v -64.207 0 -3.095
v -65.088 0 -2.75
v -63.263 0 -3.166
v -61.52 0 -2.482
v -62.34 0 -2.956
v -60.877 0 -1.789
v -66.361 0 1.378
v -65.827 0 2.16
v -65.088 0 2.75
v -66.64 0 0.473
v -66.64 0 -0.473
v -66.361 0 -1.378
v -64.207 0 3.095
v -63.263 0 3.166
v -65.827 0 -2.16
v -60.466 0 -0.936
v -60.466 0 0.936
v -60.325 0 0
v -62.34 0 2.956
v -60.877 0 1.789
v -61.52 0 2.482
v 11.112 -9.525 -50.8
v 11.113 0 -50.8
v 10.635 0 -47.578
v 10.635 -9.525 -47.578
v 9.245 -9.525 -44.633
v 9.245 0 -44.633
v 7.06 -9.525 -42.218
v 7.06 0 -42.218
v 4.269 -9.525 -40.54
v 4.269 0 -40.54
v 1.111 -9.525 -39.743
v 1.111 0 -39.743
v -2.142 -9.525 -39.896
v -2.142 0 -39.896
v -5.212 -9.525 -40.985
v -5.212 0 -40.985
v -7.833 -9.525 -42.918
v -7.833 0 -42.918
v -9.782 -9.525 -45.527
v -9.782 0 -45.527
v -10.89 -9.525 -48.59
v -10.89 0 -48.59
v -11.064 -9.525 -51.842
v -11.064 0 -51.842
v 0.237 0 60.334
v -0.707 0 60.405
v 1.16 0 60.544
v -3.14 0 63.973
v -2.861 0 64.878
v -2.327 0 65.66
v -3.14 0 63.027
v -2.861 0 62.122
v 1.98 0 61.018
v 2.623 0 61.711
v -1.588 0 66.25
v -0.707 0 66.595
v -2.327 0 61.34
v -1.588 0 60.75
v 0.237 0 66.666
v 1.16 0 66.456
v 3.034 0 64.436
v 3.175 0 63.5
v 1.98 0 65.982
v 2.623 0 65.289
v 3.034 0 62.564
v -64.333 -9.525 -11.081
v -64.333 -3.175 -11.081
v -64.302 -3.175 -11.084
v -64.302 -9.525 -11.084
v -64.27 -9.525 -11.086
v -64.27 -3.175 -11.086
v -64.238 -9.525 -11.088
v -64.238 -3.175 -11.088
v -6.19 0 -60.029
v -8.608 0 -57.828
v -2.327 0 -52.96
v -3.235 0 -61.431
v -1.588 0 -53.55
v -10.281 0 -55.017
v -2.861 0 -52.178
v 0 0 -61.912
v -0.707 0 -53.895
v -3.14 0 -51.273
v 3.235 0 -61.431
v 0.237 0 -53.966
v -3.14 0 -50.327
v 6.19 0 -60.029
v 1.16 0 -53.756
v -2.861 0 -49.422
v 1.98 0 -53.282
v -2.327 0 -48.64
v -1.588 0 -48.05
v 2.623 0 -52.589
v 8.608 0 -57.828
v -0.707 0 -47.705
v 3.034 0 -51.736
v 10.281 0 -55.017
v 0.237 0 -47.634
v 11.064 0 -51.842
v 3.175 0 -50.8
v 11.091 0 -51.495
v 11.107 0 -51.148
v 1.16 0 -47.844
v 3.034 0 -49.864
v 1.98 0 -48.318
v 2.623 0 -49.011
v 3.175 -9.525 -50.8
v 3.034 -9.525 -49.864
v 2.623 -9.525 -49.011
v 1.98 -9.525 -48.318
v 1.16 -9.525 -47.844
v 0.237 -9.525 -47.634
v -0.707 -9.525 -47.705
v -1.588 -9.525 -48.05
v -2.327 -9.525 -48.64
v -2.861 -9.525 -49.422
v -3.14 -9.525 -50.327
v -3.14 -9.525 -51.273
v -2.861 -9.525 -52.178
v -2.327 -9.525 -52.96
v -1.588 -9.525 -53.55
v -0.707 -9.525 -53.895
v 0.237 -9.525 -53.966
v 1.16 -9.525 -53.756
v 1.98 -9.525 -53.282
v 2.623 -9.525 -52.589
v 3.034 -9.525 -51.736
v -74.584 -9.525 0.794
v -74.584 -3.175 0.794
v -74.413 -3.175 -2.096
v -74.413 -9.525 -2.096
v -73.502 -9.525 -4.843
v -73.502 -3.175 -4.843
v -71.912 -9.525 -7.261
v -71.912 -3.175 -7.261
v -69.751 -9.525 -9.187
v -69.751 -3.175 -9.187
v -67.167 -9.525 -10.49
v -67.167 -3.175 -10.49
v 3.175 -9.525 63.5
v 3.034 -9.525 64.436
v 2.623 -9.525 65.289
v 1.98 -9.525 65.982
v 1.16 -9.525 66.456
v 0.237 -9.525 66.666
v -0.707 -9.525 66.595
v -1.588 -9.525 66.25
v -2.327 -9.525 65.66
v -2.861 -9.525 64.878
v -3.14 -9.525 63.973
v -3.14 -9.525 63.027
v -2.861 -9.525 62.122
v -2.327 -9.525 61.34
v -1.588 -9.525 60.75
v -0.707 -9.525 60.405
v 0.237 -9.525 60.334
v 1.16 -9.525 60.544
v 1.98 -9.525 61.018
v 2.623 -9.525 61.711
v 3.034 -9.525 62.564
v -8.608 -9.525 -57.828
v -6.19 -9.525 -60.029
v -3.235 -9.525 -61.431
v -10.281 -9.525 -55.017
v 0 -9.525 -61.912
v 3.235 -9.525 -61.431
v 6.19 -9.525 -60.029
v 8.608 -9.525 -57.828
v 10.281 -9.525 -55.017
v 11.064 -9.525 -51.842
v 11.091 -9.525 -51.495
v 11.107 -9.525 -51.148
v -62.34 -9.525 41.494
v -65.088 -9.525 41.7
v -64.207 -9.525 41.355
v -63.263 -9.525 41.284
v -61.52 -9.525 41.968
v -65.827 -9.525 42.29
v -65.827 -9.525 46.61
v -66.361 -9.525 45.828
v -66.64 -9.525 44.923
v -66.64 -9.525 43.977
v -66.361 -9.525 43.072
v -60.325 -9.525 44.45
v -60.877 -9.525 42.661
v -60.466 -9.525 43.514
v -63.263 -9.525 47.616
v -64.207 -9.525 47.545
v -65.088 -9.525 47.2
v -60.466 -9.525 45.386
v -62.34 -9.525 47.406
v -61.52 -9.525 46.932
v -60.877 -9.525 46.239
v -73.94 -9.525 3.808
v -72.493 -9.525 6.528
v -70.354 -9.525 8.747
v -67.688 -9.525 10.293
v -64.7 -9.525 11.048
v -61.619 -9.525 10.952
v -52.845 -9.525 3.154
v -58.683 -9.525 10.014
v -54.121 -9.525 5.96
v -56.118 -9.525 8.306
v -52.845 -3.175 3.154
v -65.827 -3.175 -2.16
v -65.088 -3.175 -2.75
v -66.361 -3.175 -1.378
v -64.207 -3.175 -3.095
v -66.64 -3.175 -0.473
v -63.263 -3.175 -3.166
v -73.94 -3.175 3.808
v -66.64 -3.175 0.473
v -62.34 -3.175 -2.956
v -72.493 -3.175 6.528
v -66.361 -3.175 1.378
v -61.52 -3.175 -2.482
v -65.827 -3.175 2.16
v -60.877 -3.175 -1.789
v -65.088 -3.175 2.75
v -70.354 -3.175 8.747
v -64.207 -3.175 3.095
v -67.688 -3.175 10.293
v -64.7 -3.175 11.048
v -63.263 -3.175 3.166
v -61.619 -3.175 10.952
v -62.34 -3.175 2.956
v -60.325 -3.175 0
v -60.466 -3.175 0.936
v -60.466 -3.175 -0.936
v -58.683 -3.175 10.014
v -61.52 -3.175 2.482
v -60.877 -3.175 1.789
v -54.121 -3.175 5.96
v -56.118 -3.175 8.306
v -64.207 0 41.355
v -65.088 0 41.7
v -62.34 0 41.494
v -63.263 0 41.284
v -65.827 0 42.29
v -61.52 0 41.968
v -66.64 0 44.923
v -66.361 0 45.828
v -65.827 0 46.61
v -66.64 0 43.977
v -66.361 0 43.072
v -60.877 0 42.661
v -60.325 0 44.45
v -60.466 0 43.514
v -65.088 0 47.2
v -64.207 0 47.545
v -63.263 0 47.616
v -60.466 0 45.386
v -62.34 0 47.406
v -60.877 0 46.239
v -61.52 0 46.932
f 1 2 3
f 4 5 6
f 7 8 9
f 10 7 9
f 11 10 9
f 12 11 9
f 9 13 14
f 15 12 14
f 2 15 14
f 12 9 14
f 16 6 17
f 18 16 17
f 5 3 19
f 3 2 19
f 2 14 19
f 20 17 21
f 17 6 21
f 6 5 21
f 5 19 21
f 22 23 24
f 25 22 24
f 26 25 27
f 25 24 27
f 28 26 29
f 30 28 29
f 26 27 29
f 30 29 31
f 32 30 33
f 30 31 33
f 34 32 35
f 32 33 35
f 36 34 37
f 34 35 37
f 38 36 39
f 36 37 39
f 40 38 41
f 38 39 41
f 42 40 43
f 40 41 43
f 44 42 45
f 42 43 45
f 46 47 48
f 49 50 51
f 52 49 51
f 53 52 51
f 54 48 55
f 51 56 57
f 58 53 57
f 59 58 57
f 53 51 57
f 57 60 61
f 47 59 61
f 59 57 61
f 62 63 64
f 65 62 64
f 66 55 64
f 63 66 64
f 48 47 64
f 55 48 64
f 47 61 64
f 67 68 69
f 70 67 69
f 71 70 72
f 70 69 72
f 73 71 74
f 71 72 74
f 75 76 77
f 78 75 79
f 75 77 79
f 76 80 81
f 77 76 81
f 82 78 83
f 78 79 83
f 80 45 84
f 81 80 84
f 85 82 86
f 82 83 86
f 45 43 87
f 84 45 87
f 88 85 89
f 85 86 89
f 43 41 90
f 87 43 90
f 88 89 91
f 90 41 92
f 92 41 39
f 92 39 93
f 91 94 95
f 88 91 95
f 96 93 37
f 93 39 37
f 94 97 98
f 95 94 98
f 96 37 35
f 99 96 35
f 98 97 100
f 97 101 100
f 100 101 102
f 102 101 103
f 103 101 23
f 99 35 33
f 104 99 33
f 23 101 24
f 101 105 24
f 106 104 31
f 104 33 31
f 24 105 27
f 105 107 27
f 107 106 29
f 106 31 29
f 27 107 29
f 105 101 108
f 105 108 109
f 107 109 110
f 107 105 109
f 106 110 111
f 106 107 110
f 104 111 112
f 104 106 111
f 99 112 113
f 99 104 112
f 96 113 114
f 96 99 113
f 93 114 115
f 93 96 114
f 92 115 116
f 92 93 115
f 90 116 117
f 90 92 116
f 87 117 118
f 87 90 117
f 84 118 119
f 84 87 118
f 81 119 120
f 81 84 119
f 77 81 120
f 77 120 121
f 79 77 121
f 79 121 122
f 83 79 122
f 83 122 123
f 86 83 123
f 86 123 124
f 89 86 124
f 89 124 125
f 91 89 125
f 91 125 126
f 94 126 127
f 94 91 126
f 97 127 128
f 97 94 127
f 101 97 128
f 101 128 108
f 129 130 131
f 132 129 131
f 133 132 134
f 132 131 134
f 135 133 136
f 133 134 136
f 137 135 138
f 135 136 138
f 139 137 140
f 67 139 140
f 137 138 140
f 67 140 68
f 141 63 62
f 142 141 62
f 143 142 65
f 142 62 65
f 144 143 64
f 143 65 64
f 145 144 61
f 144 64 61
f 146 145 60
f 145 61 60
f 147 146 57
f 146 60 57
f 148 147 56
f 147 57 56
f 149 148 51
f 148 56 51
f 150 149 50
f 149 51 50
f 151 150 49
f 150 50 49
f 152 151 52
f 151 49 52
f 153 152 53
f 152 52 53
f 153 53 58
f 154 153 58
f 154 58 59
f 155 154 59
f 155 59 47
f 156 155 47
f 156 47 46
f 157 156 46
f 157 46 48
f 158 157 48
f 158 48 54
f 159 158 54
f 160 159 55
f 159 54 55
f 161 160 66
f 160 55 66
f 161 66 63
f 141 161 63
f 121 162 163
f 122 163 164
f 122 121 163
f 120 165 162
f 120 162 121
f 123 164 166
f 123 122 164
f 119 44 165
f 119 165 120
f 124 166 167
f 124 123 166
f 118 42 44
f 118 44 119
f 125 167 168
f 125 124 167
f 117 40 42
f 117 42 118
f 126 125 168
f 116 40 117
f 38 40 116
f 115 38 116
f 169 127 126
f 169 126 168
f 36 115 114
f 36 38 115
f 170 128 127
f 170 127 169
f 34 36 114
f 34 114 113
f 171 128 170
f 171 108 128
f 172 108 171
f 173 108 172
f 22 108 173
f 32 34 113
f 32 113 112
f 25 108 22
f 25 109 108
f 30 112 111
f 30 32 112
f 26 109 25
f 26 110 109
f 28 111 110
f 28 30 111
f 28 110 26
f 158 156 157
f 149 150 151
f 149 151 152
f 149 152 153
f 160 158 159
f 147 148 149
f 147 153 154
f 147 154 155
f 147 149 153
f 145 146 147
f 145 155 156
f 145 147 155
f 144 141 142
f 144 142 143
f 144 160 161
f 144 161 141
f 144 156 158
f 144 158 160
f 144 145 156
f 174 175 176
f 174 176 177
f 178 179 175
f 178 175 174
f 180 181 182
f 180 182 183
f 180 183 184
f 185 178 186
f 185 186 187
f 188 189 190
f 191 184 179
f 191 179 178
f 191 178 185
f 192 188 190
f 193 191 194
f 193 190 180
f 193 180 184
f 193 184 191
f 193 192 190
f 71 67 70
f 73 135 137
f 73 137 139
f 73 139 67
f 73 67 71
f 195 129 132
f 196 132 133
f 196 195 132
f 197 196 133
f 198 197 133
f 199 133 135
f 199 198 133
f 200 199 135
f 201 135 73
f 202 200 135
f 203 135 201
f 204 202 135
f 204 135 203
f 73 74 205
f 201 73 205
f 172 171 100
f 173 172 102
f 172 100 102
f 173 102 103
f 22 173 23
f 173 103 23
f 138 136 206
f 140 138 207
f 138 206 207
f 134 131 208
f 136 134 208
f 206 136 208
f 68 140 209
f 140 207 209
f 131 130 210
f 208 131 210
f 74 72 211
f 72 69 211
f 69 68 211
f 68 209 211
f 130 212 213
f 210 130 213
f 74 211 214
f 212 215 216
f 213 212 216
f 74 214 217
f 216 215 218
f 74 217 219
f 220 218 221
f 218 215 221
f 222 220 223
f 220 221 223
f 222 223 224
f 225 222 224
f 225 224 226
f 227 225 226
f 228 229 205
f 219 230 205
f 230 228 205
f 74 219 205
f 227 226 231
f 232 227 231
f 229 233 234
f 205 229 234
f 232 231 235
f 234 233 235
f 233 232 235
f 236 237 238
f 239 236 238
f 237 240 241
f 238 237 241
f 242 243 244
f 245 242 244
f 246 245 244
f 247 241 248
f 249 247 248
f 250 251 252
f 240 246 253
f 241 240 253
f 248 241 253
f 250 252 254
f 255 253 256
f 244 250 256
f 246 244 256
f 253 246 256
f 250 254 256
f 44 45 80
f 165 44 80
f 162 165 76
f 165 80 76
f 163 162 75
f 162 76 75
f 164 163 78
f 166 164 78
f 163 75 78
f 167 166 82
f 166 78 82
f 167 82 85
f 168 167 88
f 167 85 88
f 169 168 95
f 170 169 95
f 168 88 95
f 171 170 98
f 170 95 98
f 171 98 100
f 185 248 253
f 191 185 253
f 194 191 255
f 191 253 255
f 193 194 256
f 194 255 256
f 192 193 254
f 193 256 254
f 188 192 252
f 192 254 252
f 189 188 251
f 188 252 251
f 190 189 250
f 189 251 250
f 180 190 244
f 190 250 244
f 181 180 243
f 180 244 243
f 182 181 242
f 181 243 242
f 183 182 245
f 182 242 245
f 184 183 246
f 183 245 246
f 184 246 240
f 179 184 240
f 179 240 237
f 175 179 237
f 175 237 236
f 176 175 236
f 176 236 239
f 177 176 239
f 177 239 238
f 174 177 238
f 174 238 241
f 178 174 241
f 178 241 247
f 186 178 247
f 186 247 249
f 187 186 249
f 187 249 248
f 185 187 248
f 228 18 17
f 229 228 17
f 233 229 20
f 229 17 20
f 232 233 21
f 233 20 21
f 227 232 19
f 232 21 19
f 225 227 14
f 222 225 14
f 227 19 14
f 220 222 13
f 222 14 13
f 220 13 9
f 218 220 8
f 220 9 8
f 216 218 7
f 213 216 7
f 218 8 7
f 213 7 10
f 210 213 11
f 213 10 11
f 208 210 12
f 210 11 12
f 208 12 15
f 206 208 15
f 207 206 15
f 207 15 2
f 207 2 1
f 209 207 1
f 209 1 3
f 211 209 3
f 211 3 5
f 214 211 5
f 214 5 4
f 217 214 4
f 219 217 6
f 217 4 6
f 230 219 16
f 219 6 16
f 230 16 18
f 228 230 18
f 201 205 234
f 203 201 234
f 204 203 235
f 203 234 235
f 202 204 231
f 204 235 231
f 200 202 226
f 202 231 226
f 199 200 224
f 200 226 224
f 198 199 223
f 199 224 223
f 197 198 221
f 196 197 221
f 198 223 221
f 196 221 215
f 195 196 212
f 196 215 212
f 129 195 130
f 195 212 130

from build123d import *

# Parameters (mm, degrees)
F0_R     = 3.175
F0_R_2   = 3.9751
F1_DEPTH = 3.175
F2_DEPTH = 3.175
F7_DEPTH = 9.525


with BuildPart() as f1:
    # F0 (on Front) → F1 (new body)
    with BuildSketch(Plane.XZ):
        with BuildLine():
            ThreePointArc((-1.190625, 15.830289), (10.351805, 12.035603), (15.830289, 1.190625))
            Line((15.830289, 1.190625), (11.081202, 64.333438))
            ThreePointArc((11.081202, 64.333438), (11.104673, 63.917012), (11.1125, 63.5))
            ThreePointArc((11.1125, 63.5), (-7.571892, 55.366483), (-0.79375, 74.584116))
            Line((-0.79375, 74.584116), (-45.016964, 71.417225))
            ThreePointArc((-45.016964, 71.417225), (-39.041505, 69.309655), (-36.5125, 63.5))
            ThreePointArc((-36.5125, 63.5), (-39.041505, 57.690345), (-45.016964, 55.582775))
            Line((-45.016964, 55.582775), (-19.875971, 53.782391))
            ThreePointArc((-19.875971, 53.782391), (-14.425704, 51.047466), (-12.516034, 45.256233))
            Line((-12.516034, 45.256233), (-14.806234, 14.806234))
            Line((-14.806234, 14.806234), (-1.190625, 15.830289))
        make_face()
        with BuildLine():
            ThreePointArc((-36.5125, 63.5), (-39.041505, 69.309655), (-45.016964, 71.417225))
            ThreePointArc((-45.016964, 71.417225), (-52.3875, 63.5), (-45.016964, 55.582775))
            ThreePointArc((-45.016964, 55.582775), (-39.041505, 57.690345), (-36.5125, 63.5))
        make_face()
        with Locations((-44.45, 63.5)):
            Circle(F0_R, mode=Mode.SUBTRACT)
        with BuildLine():
            ThreePointArc((11.1125, 63.5), (11.104673, 63.917012), (11.081202, 64.333438))
            ThreePointArc((11.081202, 64.333438), (7.261337, 71.911934), (-0.79375, 74.584116))
            ThreePointArc((-0.79375, 74.584116), (-7.571892, 55.366483), (11.1125, 63.5))
        make_face()
        with Locations((0, 63.5)):
            Circle(F0_R, mode=Mode.SUBTRACT)
        with BuildLine():
            ThreePointArc((-15.805083, -1.488281), (-15.874297, -0.149361), (-15.830289, 1.190625))
            Line((-15.830289, 1.190625), (-14.806234, 14.806234))
            Line((-14.806234, 14.806234), (-45.256233, 12.516034))
            ThreePointArc((-45.256233, 12.516034), (-51.047466, 14.425704), (-53.782391, 19.875971))
            Line((-53.782391, 19.875971), (-55.582775, 45.016964))
            ThreePointArc((-55.582775, 45.016964), (-55.56757, 44.733663), (-55.5625, 44.45))
            ThreePointArc((-55.5625, 44.45), (-63.783663, 36.51757), (-71.417225, 45.016964))
            Line((-71.417225, 45.016964), (-74.584116, 0.79375))
            ThreePointArc((-74.584116, 0.79375), (-63.102871, 11.105402), (-52.3875, 0))
            ThreePointArc((-52.3875, 0), (-55.942683, -8.147062), (-64.333438, -11.081202))
            Line((-64.333438, -11.081202), (-14.549181, -14.825567))
            Line((-14.549181, -14.825567), (-15.805083, -1.488281))
        make_face()
        with Locations((-42.8498, 0)):
            Circle(F0_R, mode=Mode.SUBTRACT)
        with BuildLine():
            ThreePointArc((15.805083, -1.488281), (15.857511, -0.744961), (15.875, 0))
            ThreePointArc((15.875, 0), (15.863818, 0.595732), (15.830289, 1.190625))
            ThreePointArc((15.830289, 1.190625), (10.351805, 12.035603), (-1.190625, 15.830289))
            ThreePointArc((-1.190625, 15.830289), (-11.22532, 11.22532), (-15.830289, 1.190625))
            ThreePointArc((-15.830289, 1.190625), (-15.874297, -0.149361), (-15.805083, -1.488281))
            ThreePointArc((-15.805083, -1.488281), (-11.119209, -11.330437), (-1.190625, -15.830289))
            ThreePointArc((-1.190625, -15.830289), (10.23811, -12.132466), (15.805083, -1.488281))
        make_face()
        Circle(F0_R_2, mode=Mode.SUBTRACT)
        with BuildLine():
            Line((11.063558, -51.841797), (15.805083, -1.488281))
            ThreePointArc((15.805083, -1.488281), (10.23811, -12.132466), (-1.190625, -15.830289))
            Line((-1.190625, -15.830289), (-14.549181, -14.825567))
            Line((-14.549181, -14.825567), (-11.063558, -51.841797))
            ThreePointArc((-11.063558, -51.841797), (-0.521473, -39.699742), (11.1125, -50.8))
            ThreePointArc((11.1125, -50.8), (11.100258, -51.321473), (11.063558, -51.841797))
        make_face()
        with Locations((3.175, -36.386943)):
            Circle(F0_R, mode=Mode.SUBTRACT)
        with BuildLine():
            ThreePointArc((-11.063558, -51.841797), (0, -61.9125), (11.063558, -51.841797))
            ThreePointArc((11.063558, -51.841797), (11.100258, -51.321473), (11.1125, -50.8))
            ThreePointArc((11.1125, -50.8), (-0.521473, -39.699742), (-11.063558, -51.841797))
        make_face()
        with Locations((0, -50.8)):
            Circle(F0_R, mode=Mode.SUBTRACT)
        Circle(F0_R_2)
        Circle(F0_R, mode=Mode.SUBTRACT)
    extrude(amount=-F1_DEPTH)


with BuildPart() as f2:
    # F0 (on Front) → F2 (new body)
    with BuildSketch(Plane.XZ):
        with BuildLine():
            ThreePointArc((-15.805083, -1.488281), (-15.874297, -0.149361), (-15.830289, 1.190625))
            Line((-15.830289, 1.190625), (-14.806234, 14.806234))
            Line((-14.806234, 14.806234), (-45.256233, 12.516034))
            ThreePointArc((-45.256233, 12.516034), (-51.047466, 14.425704), (-53.782391, 19.875971))
            Line((-53.782391, 19.875971), (-55.582775, 45.016964))
            ThreePointArc((-55.582775, 45.016964), (-55.56757, 44.733663), (-55.5625, 44.45))
            ThreePointArc((-55.5625, 44.45), (-63.783663, 36.51757), (-71.417225, 45.016964))
            Line((-71.417225, 45.016964), (-74.584116, 0.79375))
            ThreePointArc((-74.584116, 0.79375), (-63.102871, 11.105402), (-52.3875, 0))
            ThreePointArc((-52.3875, 0), (-55.942683, -8.147062), (-64.333438, -11.081202))
            Line((-64.333438, -11.081202), (-14.549181, -14.825567))
            Line((-14.549181, -14.825567), (-15.805083, -1.488281))
        make_face()
        with Locations((-42.8498, 0)):
            Circle(F0_R, mode=Mode.SUBTRACT)
        with BuildLine():
            ThreePointArc((-55.5625, 44.45), (-55.56757, 44.733663), (-55.582775, 45.016964))
            ThreePointArc((-55.582775, 45.016964), (-63.5, 52.3875), (-71.417225, 45.016964))
            ThreePointArc((-71.417225, 45.016964), (-63.783663, 36.51757), (-55.5625, 44.45))
        make_face()
        with Locations((-63.5, 44.45)):
            Circle(F0_R, mode=Mode.SUBTRACT)
        with BuildLine():
            ThreePointArc((-74.584116, 0.79375), (-71.911934, -7.261337), (-64.333438, -11.081202))
            ThreePointArc((-64.333438, -11.081202), (-55.942683, -8.147062), (-52.3875, 0))
            ThreePointArc((-52.3875, 0), (-63.102871, 11.105402), (-74.584116, 0.79375))
        make_face()
        with Locations((-63.5, 0)):
            Circle(F0_R, mode=Mode.SUBTRACT)
        with BuildLine():
            ThreePointArc((15.805083, -1.488281), (15.857511, -0.744961), (15.875, 0))
            ThreePointArc((15.875, 0), (15.863818, 0.595732), (15.830289, 1.190625))
            ThreePointArc((15.830289, 1.190625), (10.351805, 12.035603), (-1.190625, 15.830289))
            ThreePointArc((-1.190625, 15.830289), (-11.22532, 11.22532), (-15.830289, 1.190625))
            ThreePointArc((-15.830289, 1.190625), (-15.874297, -0.149361), (-15.805083, -1.488281))
            ThreePointArc((-15.805083, -1.488281), (-11.119209, -11.330437), (-1.190625, -15.830289))
            ThreePointArc((-1.190625, -15.830289), (10.23811, -12.132466), (15.805083, -1.488281))
        make_face()
        Circle(F0_R_2, mode=Mode.SUBTRACT)
        with BuildLine():
            Line((11.063558, -51.841797), (15.805083, -1.488281))
            ThreePointArc((15.805083, -1.488281), (10.23811, -12.132466), (-1.190625, -15.830289))
            Line((-1.190625, -15.830289), (-14.549181, -14.825567))
            Line((-14.549181, -14.825567), (-11.063558, -51.841797))
            ThreePointArc((-11.063558, -51.841797), (-0.521473, -39.699742), (11.1125, -50.8))
            ThreePointArc((11.1125, -50.8), (11.100258, -51.321473), (11.063558, -51.841797))
        make_face()
        with Locations((3.175, -36.386943)):
            Circle(F0_R, mode=Mode.SUBTRACT)
        Circle(F0_R_2)
        Circle(F0_R, mode=Mode.SUBTRACT)
    extrude(amount=F2_DEPTH)


with BuildPart() as f7:
    # F6 (on face) + F0 (on Front) → F7 (new body, through all)
    with BuildSketch(Plane.XZ):
        with BuildLine():
            Line((-64.238385, -11.087941), (-52.844581, 3.154314))
            ThreePointArc((-52.844581, 3.154314), (-64.699588, 11.047563), (-74.584116, 0.79375))
            ThreePointArc((-74.584116, 0.79375), (-71.911934, -7.261337), (-64.333438, -11.081202))
            ThreePointArc((-64.333438, -11.081202), (-64.285919, -11.084674), (-64.238385, -11.087941))
        make_face()
    with BuildSketch(Plane.XZ):
        with BuildLine():
            ThreePointArc((-11.063558, -51.841797), (0, -61.9125), (11.063558, -51.841797))
            ThreePointArc((11.063558, -51.841797), (11.100258, -51.321473), (11.1125, -50.8))
            ThreePointArc((11.1125, -50.8), (-0.521473, -39.699742), (-11.063558, -51.841797))
        make_face()
        with Locations((0, -50.8)):
            Circle(F0_R, mode=Mode.SUBTRACT)
        with Locations((0, 63.5)):
            Circle(F0_R)
        with Locations((-63.5, 44.45)):
            Circle(F0_R)
    extrude(amount=F7_DEPTH)

    # F8: cut F2, F1
    add(f2.part, mode=Mode.SUBTRACT)
    add(f1.part, mode=Mode.SUBTRACT)


solid = f7.part
